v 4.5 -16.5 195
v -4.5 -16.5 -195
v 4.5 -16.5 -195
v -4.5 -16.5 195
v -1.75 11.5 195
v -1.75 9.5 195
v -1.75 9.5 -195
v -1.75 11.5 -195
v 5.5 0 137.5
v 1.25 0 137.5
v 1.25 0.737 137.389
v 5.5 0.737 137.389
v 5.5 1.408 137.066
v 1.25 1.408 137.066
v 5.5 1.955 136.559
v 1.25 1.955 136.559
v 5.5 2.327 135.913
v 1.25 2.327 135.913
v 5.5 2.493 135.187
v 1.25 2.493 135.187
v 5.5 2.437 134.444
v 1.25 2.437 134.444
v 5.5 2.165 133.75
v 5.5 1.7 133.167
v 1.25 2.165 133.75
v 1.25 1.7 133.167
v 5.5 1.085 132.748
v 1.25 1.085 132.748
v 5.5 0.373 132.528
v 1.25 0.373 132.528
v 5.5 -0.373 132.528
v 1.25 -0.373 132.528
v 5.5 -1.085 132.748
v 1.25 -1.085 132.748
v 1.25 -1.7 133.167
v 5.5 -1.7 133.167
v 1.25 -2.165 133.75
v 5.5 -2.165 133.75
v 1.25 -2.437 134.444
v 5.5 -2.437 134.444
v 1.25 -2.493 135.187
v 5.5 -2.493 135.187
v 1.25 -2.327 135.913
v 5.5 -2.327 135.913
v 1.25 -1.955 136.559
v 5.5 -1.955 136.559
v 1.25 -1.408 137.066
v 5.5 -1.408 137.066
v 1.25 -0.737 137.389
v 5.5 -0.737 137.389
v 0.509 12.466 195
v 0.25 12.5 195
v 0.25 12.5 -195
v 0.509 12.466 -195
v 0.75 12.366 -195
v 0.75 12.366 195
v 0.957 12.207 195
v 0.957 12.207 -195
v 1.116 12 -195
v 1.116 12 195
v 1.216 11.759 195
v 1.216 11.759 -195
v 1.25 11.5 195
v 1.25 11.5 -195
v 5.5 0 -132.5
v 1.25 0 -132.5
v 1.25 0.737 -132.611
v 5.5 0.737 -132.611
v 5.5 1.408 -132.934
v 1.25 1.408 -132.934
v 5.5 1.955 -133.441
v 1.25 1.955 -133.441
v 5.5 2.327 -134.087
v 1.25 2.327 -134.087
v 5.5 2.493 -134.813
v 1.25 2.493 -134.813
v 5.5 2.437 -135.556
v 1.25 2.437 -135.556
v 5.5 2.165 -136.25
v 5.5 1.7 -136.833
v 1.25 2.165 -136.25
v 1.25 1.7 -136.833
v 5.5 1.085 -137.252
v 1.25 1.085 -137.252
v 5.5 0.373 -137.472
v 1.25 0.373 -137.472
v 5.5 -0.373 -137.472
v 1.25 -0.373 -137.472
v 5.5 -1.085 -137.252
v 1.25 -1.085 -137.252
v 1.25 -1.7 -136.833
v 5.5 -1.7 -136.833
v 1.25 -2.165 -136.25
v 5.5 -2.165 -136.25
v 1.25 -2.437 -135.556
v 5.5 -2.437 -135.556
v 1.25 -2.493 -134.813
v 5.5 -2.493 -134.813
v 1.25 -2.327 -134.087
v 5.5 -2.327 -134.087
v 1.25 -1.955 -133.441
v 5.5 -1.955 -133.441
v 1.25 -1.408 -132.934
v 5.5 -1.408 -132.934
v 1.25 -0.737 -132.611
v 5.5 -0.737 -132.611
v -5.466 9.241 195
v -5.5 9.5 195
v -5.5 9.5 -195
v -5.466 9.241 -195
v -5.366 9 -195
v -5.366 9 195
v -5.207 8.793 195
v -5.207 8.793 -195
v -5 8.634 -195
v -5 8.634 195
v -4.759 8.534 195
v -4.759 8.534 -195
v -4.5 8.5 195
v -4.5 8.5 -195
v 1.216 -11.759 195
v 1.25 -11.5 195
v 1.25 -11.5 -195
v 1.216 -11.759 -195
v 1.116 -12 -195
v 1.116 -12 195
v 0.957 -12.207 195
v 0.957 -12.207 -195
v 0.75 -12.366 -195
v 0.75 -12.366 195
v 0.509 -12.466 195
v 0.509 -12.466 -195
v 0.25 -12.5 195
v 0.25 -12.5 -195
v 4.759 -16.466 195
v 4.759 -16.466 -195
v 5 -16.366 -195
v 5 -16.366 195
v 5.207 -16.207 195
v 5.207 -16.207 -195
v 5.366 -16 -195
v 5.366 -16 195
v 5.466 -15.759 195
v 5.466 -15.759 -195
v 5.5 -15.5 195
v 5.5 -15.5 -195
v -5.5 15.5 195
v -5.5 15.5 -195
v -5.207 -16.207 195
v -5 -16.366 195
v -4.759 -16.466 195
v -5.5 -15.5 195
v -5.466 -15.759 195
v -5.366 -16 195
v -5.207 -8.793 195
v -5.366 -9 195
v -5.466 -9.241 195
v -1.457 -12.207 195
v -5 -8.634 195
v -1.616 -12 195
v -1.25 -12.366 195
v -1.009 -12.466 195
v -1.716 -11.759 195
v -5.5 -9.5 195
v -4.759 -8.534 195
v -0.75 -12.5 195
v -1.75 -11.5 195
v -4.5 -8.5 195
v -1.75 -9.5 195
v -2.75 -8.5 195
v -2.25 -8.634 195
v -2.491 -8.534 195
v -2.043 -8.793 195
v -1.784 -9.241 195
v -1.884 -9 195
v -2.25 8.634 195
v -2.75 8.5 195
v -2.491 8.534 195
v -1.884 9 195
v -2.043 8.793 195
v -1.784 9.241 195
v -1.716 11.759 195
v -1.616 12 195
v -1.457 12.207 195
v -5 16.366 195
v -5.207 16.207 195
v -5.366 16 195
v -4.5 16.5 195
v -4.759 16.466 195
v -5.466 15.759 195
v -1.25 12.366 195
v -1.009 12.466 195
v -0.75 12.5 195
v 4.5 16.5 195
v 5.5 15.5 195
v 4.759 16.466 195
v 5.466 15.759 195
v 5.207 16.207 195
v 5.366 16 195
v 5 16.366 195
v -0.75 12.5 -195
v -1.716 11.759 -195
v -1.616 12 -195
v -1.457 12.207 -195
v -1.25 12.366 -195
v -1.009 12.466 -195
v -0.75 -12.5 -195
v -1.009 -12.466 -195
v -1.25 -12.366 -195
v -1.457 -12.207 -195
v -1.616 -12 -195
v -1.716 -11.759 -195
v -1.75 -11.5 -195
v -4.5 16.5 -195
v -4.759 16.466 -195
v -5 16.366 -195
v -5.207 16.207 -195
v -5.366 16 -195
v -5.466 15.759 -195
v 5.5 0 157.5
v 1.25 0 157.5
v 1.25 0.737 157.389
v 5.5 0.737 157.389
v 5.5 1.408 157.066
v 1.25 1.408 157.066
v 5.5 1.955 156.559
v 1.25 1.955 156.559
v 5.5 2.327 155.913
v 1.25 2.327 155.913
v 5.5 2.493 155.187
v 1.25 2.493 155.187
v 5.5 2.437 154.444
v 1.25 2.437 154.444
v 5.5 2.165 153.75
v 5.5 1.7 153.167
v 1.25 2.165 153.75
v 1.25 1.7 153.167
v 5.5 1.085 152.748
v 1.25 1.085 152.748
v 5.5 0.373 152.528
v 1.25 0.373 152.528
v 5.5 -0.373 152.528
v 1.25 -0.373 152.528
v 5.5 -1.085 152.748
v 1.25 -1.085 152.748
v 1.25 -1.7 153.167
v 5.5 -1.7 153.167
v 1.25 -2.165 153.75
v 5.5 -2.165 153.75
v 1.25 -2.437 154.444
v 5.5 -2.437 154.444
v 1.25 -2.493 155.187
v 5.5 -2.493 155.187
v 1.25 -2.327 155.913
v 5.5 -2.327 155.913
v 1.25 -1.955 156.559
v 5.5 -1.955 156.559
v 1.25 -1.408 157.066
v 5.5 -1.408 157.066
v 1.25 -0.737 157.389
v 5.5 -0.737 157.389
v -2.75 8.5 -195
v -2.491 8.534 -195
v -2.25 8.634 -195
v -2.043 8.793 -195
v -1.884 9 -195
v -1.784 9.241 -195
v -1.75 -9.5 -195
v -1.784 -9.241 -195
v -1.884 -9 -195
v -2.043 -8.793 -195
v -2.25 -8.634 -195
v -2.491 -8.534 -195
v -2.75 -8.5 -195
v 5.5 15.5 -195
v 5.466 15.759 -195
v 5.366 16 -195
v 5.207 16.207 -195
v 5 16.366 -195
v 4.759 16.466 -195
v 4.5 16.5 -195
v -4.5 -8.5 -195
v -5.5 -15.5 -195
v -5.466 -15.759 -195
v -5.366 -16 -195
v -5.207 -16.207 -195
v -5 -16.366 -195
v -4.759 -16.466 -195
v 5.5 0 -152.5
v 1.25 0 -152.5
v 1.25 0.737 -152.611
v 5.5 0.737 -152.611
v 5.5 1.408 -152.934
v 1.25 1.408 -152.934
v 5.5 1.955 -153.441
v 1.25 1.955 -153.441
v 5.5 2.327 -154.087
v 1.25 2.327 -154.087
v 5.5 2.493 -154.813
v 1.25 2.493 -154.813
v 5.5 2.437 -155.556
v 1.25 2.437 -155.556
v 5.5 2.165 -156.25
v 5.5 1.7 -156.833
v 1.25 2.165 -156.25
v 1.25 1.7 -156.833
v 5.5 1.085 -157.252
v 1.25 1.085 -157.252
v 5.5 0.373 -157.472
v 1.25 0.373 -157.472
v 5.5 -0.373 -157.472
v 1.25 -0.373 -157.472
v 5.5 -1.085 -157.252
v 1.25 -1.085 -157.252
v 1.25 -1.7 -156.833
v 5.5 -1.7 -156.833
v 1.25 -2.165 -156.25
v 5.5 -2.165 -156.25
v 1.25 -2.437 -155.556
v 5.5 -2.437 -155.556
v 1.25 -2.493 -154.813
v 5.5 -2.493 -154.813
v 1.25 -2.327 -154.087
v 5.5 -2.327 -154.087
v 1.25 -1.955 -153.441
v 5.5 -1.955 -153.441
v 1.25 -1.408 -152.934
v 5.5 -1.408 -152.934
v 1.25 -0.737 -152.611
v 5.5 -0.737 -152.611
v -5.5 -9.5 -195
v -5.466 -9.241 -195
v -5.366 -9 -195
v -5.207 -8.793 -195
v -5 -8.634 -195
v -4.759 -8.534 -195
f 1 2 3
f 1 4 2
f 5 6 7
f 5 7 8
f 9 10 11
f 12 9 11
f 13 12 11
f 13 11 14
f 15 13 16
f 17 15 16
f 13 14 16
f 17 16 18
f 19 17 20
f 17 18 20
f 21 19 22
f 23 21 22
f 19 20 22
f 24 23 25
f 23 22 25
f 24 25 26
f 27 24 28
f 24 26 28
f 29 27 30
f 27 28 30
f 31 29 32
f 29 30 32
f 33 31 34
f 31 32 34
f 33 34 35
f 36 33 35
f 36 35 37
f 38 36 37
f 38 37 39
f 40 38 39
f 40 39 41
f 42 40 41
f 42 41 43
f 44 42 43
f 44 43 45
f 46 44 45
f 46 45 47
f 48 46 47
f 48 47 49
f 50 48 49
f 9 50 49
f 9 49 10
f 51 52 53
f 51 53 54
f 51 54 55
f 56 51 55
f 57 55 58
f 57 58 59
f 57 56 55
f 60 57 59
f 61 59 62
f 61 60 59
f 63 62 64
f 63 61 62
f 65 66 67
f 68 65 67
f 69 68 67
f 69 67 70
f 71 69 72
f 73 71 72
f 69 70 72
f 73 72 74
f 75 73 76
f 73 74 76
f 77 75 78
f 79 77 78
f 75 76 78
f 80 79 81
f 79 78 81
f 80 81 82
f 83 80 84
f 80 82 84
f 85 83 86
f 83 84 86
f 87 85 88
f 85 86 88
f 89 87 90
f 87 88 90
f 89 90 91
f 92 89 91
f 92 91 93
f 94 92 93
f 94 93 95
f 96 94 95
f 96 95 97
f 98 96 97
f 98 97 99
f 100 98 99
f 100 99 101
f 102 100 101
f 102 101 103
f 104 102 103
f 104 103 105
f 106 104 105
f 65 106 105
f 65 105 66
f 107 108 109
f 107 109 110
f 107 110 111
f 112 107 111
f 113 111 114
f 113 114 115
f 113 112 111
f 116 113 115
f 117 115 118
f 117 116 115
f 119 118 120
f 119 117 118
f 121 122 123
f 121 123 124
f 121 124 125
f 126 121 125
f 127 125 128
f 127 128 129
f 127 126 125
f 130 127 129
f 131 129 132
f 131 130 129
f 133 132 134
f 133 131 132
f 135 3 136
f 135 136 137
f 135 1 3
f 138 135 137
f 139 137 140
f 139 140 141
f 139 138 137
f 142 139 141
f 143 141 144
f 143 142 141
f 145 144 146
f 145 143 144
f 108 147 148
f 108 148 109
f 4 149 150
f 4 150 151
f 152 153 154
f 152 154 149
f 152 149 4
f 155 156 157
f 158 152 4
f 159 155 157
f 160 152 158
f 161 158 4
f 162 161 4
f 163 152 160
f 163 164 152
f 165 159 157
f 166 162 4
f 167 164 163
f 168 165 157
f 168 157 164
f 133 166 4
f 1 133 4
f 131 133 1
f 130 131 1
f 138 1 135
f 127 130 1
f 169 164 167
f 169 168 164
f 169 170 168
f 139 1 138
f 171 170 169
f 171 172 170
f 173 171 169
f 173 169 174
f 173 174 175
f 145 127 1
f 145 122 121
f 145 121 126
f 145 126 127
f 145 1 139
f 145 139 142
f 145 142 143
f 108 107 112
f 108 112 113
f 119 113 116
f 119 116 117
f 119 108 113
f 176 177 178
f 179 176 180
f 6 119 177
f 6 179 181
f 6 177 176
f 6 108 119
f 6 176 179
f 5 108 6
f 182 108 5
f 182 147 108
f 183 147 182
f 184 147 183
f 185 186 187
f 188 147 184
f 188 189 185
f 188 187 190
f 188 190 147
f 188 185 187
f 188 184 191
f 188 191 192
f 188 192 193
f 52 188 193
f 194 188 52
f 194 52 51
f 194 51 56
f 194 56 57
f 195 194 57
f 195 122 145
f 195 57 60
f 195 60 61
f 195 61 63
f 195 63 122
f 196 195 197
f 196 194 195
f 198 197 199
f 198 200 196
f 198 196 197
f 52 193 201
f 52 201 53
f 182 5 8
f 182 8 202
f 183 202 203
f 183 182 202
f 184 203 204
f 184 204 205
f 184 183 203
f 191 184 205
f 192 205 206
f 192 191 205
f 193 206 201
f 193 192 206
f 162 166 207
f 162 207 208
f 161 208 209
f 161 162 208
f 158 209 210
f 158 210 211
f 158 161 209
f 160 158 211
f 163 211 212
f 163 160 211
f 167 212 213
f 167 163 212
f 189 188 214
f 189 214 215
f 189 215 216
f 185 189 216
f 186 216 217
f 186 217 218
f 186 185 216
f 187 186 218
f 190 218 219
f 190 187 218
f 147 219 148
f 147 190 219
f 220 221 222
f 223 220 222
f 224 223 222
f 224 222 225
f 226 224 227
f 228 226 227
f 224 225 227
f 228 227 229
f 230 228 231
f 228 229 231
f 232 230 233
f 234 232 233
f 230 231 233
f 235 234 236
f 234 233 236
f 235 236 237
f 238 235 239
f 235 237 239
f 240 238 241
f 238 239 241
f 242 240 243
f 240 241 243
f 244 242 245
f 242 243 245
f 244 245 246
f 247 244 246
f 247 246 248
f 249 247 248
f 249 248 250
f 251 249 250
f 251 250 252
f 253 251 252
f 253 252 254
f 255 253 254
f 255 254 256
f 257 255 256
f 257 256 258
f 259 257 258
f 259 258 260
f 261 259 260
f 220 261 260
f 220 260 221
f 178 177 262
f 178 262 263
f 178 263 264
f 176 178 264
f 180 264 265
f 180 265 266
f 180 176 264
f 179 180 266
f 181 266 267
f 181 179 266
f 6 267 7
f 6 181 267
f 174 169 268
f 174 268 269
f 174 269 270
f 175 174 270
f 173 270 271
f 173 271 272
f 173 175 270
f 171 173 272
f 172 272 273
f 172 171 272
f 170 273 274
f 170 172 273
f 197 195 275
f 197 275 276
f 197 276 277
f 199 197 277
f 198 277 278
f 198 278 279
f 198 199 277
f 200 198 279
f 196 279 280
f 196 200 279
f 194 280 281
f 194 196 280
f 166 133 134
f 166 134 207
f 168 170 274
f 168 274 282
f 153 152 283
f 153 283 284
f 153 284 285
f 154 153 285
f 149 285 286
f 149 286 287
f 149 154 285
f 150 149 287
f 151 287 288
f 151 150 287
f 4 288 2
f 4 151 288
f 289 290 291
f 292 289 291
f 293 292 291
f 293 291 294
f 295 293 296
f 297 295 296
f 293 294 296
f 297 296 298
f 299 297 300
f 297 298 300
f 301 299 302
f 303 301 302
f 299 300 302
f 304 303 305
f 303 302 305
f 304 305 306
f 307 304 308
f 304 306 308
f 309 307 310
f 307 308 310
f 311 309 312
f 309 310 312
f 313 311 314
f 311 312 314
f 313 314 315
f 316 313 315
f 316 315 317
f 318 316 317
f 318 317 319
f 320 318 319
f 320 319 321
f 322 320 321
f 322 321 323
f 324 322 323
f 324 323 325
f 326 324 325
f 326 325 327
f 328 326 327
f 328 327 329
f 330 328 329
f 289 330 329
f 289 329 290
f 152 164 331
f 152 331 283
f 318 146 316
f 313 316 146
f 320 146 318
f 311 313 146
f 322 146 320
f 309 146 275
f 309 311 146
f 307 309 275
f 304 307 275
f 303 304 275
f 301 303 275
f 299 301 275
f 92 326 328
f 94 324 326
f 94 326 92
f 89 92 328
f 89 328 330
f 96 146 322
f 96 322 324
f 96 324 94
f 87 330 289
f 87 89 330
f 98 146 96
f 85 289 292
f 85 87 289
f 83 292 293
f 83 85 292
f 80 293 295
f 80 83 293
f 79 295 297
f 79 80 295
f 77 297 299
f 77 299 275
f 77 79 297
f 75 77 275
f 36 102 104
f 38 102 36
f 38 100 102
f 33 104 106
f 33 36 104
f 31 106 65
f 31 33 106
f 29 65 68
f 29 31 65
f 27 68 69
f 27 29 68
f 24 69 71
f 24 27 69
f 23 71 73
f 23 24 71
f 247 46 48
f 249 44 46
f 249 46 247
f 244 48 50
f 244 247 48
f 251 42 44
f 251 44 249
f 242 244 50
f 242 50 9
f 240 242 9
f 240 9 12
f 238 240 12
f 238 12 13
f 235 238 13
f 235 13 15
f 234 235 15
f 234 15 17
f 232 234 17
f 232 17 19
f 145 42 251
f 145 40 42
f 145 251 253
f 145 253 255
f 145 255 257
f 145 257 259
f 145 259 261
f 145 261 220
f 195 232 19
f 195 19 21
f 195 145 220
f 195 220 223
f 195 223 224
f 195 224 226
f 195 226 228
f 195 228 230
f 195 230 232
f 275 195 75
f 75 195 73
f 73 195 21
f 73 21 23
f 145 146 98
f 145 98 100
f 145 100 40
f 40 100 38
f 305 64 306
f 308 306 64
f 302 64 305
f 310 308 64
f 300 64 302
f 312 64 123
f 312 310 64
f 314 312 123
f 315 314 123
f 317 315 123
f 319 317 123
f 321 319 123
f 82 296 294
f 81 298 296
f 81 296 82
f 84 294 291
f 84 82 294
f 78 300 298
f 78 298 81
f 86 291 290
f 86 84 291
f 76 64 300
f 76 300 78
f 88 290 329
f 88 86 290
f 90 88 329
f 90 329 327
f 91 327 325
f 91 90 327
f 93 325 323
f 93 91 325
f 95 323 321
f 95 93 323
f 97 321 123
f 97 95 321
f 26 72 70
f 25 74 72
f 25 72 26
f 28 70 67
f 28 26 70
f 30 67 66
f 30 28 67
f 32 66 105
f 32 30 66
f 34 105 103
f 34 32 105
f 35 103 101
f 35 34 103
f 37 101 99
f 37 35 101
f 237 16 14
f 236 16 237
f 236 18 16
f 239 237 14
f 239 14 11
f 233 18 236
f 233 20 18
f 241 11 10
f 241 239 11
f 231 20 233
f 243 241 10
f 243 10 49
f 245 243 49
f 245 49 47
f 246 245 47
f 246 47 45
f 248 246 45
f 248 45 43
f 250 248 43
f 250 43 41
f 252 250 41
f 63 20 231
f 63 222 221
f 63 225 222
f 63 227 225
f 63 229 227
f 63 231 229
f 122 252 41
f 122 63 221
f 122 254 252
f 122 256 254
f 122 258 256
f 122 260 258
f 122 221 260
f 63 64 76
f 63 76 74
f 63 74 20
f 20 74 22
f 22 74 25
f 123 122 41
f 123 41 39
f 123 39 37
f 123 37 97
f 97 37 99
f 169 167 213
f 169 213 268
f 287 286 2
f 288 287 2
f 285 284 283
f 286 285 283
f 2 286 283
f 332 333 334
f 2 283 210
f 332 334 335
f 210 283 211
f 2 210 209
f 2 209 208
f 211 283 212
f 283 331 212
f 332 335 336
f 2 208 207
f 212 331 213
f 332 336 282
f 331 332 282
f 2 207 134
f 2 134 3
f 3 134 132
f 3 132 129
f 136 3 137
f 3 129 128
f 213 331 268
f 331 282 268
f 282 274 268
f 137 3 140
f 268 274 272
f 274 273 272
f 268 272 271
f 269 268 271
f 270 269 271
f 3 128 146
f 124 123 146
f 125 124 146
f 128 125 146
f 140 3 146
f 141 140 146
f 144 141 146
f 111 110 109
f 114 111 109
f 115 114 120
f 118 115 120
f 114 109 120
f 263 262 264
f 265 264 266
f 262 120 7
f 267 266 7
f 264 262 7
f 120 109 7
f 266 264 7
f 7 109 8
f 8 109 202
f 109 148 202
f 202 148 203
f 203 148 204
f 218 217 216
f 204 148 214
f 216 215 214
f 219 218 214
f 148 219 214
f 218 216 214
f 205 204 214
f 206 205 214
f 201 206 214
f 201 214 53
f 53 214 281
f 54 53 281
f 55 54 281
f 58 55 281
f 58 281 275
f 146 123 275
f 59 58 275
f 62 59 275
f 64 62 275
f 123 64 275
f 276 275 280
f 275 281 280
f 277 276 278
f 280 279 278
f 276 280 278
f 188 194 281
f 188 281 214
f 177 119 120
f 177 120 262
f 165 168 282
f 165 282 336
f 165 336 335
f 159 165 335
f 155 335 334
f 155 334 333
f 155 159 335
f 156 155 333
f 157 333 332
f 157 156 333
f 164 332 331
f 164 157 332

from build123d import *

# Parameters (mm, degrees)
BOSS_EXTRUDE1_DEPTH = 195
CUT_EXTRUDE1_REACH  = 197.813
SKETCH2_R           = 2.5


with BuildPart() as part:
    # Sketch1 → Boss-Extrude1 (new, symmetric)
    with BuildSketch(Plane.XY):
        with BuildLine():
            Line((5.5, -15.5), (5.5, 15.5))
            ThreePointArc((5.5, 15.5), (5.207106781, 16.207106781), (4.5, 16.5))
            Line((4.5, 16.5), (-4.5, 16.5))
            ThreePointArc((-4.5, 16.5), (-5.207106781, 16.207106781), (-5.5, 15.5))
            Line((-5.5, 15.5), (-5.5, 9.5))
            ThreePointArc((-5.5, 9.5), (-5.207106781, 8.792893219), (-4.5, 8.5))
            Line((-4.5, 8.5), (-2.75, 8.5))
            ThreePointArc((-2.75, 8.5), (-2.042893219, 8.792893219), (-1.75, 9.5))
            Line((-1.75, 9.5), (-1.75, 11.5))
            ThreePointArc((-1.75, 11.5), (-1.457106781, 12.207106781), (-0.75, 12.5))
            Line((-0.75, 12.5), (0.25, 12.5))
            ThreePointArc((0.25, 12.5), (0.957106781, 12.207106781), (1.25, 11.5))
            Line((1.25, 11.5), (1.25, -11.5))
            ThreePointArc((1.25, -11.5), (0.957106781, -12.207106781), (0.25, -12.5))
            Line((0.25, -12.5), (-0.75, -12.5))
            ThreePointArc((-0.75, -12.5), (-1.457106781, -12.207106781), (-1.75, -11.5))
            Line((-1.75, -11.5), (-1.75, -9.5))
            ThreePointArc((-1.75, -9.5), (-2.042893219, -8.792893219), (-2.75, -8.5))
            Line((-2.75, -8.5), (-4.5, -8.5))
            ThreePointArc((-4.5, -8.5), (-5.207106781, -8.792893219), (-5.5, -9.5))
            Line((-5.5, -9.5), (-5.5, -15.5))
            ThreePointArc((-5.5, -15.5), (-5.207106781, -16.207106781), (-4.5, -16.5))
            Line((-4.5, -16.5), (4.5, -16.5))
            ThreePointArc((4.5, -16.5), (5.207106781, -16.207106781), (5.5, -15.5))
        make_face()
    extrude(amount=BOSS_EXTRUDE1_DEPTH, both=True)

    # Sketch2 → Cut-Extrude1 (cut, up to next)
    with BuildSketch(Plane.ZY.offset(-1.25), mode=Mode.PRIVATE) as cut_extrude1_sk1:
        with Locations((155, 0)):
            Circle(SKETCH2_R)
    cut_extrude1_tool1 = extrude(cut_extrude1_sk1.sketch, amount=-CUT_EXTRUDE1_REACH, mode=Mode.PRIVATE) & part.part
    # Sketch2 → Cut-Extrude1 (cut, up to next)
    with BuildSketch(Plane.ZY.offset(-1.25), mode=Mode.PRIVATE) as cut_extrude1_sk2:
        with Locations((135, 0)):
            Circle(SKETCH2_R)
    cut_extrude1_tool2 = extrude(cut_extrude1_sk2.sketch, amount=-CUT_EXTRUDE1_REACH, mode=Mode.PRIVATE) & part.part
    # Sketch2 → Cut-Extrude1 (cut, up to next)
    with BuildSketch(Plane.ZY.offset(-1.25), mode=Mode.PRIVATE) as cut_extrude1_sk3:
        with Locations((-135, 0)):
            Circle(SKETCH2_R)
    cut_extrude1_tool3 = extrude(cut_extrude1_sk3.sketch, amount=-CUT_EXTRUDE1_REACH, mode=Mode.PRIVATE) & part.part
    # Sketch2 → Cut-Extrude1 (cut, up to next)
    with BuildSketch(Plane.ZY.offset(-1.25), mode=Mode.PRIVATE) as cut_extrude1_sk4:
        with Locations((-155, 0)):
            Circle(SKETCH2_R)
    cut_extrude1_tool4 = extrude(cut_extrude1_sk4.sketch, amount=-CUT_EXTRUDE1_REACH, mode=Mode.PRIVATE) & part.part
    add(cut_extrude1_tool1.solids().sort_by_distance((1.25, 0, 155))[0], mode=Mode.SUBTRACT)
    add(cut_extrude1_tool2.solids().sort_by_distance((1.25, 0, 135))[0], mode=Mode.SUBTRACT)
    add(cut_extrude1_tool3.solids().sort_by_distance((1.25, 0, -135))[0], mode=Mode.SUBTRACT)
    add(cut_extrude1_tool4.solids().sort_by_distance((1.25, 0, -155))[0], mode=Mode.SUBTRACT)


solid = part.part
